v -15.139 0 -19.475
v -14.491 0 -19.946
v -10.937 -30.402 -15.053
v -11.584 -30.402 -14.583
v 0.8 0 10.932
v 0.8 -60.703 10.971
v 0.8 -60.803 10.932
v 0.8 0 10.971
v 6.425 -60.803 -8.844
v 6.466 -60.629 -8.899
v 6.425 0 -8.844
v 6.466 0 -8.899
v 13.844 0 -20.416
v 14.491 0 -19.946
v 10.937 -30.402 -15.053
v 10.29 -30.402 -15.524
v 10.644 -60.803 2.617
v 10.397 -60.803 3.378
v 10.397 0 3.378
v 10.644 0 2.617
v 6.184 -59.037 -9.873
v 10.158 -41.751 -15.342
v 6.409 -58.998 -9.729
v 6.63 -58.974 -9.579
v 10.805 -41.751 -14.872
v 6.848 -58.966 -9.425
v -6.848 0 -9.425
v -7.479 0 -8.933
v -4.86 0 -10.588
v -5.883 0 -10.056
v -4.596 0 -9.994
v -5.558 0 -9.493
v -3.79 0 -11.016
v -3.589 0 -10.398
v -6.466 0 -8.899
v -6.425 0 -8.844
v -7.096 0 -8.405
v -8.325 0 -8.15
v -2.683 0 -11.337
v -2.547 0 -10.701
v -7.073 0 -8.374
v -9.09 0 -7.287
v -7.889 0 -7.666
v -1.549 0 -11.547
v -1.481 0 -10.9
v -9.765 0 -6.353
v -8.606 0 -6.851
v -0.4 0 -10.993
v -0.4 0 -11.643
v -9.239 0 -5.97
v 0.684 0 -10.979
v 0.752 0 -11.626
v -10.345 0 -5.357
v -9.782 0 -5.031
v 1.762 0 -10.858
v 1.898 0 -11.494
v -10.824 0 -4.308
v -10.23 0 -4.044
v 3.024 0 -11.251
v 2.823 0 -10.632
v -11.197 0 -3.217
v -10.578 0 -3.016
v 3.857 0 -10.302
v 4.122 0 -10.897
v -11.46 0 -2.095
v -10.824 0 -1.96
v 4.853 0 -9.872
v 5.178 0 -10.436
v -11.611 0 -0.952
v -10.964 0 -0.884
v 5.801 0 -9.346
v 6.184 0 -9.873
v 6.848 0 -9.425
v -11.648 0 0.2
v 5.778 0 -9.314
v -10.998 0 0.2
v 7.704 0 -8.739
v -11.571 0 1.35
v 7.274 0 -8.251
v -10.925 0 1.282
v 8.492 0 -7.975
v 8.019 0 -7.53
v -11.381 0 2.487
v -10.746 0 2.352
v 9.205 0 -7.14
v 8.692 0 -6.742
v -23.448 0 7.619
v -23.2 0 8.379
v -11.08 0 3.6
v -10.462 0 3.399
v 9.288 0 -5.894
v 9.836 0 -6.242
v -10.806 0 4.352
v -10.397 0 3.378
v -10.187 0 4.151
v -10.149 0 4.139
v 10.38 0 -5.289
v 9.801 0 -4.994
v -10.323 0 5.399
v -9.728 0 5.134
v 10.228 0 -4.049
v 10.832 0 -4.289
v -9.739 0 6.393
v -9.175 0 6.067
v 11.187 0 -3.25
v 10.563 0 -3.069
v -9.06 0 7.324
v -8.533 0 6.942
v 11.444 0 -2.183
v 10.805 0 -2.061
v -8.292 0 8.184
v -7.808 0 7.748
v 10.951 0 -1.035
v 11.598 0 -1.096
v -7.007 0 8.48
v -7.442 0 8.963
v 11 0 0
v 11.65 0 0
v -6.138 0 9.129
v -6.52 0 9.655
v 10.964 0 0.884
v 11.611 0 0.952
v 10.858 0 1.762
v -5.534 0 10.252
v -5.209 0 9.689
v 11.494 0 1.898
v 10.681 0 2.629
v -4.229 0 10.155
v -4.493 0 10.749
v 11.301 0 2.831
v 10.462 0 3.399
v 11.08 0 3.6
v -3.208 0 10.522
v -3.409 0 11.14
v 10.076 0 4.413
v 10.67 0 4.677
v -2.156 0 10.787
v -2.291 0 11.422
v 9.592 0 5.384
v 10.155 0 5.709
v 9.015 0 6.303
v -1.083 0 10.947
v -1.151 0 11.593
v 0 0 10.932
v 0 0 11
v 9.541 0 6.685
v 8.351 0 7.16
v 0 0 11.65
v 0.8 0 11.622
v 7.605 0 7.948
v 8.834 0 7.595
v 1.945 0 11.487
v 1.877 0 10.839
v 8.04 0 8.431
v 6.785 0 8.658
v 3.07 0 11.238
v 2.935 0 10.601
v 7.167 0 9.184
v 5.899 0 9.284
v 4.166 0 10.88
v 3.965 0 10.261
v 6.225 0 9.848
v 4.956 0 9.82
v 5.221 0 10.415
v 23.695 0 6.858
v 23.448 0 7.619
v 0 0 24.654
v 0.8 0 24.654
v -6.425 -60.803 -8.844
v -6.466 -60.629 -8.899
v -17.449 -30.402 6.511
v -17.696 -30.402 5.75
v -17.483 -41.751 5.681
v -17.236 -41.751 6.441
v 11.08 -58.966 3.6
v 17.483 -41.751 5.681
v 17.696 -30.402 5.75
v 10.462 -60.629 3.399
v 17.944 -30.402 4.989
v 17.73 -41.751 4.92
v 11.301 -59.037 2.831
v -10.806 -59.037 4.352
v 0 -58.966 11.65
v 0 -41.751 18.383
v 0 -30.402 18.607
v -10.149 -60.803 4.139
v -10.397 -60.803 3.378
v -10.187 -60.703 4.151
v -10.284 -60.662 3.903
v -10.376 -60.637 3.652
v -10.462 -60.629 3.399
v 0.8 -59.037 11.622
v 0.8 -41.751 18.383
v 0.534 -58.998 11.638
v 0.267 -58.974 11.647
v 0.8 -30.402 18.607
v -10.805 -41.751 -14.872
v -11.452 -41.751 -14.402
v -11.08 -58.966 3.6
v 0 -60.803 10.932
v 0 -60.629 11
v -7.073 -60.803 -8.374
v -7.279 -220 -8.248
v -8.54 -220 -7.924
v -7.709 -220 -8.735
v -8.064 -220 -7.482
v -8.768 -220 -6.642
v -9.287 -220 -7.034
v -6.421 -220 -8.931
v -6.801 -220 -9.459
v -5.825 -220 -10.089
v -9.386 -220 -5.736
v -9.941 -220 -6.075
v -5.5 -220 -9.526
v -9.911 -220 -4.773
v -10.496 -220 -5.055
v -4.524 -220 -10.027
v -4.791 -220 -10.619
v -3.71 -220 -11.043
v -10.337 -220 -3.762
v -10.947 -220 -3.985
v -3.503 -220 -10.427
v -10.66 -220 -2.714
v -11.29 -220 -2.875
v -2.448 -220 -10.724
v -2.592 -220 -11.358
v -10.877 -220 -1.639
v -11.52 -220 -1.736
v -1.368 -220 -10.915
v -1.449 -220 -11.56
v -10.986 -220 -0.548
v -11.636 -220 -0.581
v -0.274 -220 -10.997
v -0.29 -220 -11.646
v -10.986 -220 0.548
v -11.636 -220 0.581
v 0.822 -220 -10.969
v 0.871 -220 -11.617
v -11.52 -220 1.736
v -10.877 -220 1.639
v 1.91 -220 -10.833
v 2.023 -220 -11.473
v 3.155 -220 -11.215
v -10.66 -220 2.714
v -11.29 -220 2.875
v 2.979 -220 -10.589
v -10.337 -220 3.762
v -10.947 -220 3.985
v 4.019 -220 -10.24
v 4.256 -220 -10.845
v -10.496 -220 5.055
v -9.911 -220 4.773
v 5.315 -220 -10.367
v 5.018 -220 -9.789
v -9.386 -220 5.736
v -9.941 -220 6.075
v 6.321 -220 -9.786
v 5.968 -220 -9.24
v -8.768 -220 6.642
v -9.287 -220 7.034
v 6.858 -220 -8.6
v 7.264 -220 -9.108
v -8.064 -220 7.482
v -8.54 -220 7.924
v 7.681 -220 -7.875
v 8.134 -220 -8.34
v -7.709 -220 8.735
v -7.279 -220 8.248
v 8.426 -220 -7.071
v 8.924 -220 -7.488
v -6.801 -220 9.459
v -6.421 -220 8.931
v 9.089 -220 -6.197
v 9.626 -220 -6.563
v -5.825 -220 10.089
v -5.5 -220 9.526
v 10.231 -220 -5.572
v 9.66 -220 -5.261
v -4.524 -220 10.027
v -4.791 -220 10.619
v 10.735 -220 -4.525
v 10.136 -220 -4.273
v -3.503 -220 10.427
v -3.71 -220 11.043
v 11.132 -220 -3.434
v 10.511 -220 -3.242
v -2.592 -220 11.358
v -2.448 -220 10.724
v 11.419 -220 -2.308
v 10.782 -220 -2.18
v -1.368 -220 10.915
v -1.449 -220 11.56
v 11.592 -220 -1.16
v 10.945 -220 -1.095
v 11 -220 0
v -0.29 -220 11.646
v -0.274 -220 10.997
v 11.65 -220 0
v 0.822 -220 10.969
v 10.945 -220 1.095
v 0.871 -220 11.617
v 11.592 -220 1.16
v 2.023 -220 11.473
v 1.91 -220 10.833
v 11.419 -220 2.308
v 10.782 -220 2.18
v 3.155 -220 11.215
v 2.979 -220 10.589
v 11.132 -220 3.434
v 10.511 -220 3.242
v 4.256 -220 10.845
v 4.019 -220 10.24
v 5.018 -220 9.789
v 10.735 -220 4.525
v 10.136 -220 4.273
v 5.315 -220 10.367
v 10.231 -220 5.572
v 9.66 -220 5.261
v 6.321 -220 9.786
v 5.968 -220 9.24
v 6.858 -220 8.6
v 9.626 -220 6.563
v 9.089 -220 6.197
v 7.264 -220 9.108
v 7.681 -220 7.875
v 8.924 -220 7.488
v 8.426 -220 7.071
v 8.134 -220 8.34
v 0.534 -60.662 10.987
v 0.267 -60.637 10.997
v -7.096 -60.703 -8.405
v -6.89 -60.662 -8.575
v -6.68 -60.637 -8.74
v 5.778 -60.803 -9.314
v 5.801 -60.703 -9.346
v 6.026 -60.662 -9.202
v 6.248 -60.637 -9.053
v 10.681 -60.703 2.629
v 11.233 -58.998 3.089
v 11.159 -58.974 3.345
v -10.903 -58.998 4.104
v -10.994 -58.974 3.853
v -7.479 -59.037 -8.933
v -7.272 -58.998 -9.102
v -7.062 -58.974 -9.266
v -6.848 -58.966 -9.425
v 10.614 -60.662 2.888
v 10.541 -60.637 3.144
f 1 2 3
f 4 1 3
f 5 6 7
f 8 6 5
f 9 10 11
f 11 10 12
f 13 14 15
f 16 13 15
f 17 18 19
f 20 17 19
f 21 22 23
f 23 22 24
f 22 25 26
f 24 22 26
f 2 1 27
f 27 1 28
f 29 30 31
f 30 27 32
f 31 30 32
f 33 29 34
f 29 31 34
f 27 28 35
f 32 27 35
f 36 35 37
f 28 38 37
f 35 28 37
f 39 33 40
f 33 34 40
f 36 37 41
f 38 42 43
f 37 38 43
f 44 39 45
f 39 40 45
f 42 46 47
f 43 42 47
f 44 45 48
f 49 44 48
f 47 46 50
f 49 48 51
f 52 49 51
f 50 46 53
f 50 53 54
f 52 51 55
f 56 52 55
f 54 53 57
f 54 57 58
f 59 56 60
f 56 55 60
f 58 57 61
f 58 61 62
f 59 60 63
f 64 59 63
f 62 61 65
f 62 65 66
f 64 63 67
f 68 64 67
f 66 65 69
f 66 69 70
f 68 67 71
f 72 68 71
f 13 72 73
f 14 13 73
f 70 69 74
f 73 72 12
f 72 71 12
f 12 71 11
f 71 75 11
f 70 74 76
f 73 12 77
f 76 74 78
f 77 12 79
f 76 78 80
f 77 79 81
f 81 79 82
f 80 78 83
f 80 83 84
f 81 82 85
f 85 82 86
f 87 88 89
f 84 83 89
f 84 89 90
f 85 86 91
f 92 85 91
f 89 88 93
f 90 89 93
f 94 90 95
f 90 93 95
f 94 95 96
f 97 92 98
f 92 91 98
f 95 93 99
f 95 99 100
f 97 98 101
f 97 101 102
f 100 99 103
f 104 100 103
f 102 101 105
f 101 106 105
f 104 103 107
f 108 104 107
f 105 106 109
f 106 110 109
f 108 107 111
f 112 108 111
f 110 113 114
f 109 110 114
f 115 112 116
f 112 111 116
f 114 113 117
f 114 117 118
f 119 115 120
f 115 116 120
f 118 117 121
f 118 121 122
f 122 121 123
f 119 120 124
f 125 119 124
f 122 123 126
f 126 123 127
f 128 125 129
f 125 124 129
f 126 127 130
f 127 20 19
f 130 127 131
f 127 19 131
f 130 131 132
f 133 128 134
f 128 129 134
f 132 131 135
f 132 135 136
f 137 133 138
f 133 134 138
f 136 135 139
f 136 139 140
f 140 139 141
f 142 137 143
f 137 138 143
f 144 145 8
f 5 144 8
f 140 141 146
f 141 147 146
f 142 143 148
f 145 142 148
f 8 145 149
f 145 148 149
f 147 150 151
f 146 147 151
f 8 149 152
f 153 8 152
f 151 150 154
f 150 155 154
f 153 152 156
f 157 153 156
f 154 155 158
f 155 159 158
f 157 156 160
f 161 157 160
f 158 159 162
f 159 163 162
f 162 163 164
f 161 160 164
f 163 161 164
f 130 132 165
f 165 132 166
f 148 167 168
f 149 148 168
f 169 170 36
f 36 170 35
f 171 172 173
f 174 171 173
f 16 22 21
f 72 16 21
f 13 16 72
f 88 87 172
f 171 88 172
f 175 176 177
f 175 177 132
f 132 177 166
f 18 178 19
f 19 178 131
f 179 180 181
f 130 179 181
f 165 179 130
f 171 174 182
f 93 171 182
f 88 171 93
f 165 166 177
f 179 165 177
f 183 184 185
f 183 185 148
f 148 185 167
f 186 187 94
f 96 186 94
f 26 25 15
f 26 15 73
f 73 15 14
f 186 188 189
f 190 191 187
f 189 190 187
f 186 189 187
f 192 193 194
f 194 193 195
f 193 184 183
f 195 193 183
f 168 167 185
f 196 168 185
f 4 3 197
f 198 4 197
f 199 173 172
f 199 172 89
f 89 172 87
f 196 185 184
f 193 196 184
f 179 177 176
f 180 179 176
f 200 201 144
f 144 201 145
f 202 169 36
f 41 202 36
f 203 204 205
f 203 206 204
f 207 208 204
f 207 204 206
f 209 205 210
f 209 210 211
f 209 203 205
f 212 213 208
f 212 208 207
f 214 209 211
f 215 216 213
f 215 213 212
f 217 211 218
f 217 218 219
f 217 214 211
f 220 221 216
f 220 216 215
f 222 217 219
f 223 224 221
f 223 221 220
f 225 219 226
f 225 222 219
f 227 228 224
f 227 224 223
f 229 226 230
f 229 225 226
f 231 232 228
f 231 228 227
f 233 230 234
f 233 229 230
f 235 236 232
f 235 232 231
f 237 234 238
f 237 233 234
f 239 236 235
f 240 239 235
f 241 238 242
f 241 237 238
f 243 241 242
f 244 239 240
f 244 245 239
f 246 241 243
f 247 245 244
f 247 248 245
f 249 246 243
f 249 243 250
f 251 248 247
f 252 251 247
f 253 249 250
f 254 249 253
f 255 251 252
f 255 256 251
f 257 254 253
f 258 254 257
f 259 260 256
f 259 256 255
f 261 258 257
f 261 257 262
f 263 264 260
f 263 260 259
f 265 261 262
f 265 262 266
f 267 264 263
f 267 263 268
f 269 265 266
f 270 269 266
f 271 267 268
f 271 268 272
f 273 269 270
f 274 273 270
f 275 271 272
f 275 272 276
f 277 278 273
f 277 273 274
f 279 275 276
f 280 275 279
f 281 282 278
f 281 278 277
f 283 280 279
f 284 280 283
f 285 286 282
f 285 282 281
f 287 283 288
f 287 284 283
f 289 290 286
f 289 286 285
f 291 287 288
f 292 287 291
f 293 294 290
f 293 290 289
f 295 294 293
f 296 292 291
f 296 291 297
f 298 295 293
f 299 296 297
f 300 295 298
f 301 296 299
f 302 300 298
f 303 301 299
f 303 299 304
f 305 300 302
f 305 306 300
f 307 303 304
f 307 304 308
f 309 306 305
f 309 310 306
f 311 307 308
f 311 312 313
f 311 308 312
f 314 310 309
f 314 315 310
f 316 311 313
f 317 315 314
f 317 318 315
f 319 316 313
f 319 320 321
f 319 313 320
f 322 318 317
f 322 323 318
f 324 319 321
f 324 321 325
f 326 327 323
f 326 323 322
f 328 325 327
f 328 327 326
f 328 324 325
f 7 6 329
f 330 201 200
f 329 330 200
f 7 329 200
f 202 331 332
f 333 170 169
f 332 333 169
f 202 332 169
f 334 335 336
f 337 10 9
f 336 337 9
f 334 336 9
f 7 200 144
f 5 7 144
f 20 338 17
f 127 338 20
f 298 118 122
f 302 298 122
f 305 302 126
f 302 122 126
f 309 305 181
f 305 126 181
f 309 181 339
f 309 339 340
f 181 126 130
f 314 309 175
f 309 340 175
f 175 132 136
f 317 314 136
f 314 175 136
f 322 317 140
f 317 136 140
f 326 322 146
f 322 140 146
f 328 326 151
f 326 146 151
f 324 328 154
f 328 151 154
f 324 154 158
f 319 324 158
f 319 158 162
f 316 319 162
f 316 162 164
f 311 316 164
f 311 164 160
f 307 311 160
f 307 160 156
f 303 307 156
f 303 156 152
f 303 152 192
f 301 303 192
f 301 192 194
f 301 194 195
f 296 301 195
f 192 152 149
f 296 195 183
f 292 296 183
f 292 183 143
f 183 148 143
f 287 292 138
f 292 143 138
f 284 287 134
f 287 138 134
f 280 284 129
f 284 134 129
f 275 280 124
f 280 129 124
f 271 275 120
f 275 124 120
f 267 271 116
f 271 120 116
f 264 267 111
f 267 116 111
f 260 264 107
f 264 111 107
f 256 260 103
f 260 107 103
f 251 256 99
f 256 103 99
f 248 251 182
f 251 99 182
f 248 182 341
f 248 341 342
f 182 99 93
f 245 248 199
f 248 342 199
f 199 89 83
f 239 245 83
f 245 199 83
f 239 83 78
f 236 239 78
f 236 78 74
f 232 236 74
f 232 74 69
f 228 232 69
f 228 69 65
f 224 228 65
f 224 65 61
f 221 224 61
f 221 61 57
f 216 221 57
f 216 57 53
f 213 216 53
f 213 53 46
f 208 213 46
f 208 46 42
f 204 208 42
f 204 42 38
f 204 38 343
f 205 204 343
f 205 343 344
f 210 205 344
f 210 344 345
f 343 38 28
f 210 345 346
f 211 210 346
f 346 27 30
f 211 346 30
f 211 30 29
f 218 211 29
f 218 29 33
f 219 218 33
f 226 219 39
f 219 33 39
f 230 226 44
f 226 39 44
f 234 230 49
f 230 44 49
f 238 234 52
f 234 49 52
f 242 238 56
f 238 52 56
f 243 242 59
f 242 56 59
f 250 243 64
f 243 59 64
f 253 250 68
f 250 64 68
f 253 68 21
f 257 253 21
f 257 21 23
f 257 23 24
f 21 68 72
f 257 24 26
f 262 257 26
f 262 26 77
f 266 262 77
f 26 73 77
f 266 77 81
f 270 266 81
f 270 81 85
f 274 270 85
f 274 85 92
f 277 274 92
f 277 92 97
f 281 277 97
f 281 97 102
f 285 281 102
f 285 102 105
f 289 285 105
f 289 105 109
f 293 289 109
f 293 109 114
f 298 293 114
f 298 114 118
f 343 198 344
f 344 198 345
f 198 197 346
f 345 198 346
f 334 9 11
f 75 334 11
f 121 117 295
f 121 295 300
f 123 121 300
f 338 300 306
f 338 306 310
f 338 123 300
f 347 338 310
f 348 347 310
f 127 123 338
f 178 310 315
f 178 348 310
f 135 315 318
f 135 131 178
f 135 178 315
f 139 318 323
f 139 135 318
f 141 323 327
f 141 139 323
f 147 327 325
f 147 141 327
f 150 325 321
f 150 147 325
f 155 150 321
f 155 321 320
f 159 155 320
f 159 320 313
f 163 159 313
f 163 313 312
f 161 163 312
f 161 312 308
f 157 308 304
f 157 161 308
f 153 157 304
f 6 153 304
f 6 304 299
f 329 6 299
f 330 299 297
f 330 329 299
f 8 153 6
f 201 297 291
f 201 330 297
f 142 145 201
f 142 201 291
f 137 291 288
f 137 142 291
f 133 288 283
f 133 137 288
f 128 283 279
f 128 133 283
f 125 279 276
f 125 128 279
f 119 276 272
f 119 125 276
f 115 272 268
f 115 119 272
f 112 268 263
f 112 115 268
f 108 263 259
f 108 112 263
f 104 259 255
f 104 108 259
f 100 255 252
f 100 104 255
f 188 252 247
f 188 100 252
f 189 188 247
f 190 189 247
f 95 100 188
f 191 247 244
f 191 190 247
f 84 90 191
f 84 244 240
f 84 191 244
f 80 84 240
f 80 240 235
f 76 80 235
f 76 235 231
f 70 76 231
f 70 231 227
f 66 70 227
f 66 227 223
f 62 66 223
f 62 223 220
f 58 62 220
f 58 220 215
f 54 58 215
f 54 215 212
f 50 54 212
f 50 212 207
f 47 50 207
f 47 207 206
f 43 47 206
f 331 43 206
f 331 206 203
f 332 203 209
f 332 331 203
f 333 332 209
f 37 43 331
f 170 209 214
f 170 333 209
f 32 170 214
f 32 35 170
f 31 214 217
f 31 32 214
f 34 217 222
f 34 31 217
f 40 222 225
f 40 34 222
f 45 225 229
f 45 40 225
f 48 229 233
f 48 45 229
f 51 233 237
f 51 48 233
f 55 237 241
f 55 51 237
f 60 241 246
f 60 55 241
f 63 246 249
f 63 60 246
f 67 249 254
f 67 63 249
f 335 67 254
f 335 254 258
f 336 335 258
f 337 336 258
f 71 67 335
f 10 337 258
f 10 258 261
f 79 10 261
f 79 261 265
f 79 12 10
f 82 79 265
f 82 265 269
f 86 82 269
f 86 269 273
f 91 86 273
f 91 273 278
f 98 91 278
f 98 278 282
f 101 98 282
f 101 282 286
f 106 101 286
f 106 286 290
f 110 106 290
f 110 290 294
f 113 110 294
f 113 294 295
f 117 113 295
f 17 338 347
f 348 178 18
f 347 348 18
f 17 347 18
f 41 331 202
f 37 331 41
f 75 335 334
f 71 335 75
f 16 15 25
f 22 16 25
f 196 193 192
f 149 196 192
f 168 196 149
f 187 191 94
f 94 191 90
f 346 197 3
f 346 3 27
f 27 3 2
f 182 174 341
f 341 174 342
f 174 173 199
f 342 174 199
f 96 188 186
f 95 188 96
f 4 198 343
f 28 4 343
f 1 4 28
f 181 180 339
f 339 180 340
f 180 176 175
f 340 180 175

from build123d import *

# Parameters (mm, degrees)
F0_R     = 11.65
F0_R_2   = 11
F1_DEPTH = 220
F3_DEPTH = 0.8
F4_COUNT = 5


with BuildPart() as f1:
    # F0 (on Front) → F1 (new body)
    with BuildSketch(Plane.XZ):
        Circle(F0_R)
        Circle(F0_R_2, mode=Mode.SUBTRACT)
    extrude(amount=F1_DEPTH)

    # F2 (on Right) → F3 (join)
    with BuildSketch(Plane.YZ):
        Polygon((-60.803428, 10.931599), (0, 10.931599), (0, 24.654245), (-30.401714, 18.606978), (-41.75102, 18.382577), align=None)
    extrude(amount=F3_DEPTH)

    # F4: F1 ×5 about axis
    f4_axis = Axis((0, 0, 0), (0, -1, 0))


with BuildPart() as f1_1:
    add(f1.part)
    for i in range(1, F4_COUNT):
        add(f1.part.rotate(f4_axis, i * 360 / F4_COUNT))


solid = f1_1.part
